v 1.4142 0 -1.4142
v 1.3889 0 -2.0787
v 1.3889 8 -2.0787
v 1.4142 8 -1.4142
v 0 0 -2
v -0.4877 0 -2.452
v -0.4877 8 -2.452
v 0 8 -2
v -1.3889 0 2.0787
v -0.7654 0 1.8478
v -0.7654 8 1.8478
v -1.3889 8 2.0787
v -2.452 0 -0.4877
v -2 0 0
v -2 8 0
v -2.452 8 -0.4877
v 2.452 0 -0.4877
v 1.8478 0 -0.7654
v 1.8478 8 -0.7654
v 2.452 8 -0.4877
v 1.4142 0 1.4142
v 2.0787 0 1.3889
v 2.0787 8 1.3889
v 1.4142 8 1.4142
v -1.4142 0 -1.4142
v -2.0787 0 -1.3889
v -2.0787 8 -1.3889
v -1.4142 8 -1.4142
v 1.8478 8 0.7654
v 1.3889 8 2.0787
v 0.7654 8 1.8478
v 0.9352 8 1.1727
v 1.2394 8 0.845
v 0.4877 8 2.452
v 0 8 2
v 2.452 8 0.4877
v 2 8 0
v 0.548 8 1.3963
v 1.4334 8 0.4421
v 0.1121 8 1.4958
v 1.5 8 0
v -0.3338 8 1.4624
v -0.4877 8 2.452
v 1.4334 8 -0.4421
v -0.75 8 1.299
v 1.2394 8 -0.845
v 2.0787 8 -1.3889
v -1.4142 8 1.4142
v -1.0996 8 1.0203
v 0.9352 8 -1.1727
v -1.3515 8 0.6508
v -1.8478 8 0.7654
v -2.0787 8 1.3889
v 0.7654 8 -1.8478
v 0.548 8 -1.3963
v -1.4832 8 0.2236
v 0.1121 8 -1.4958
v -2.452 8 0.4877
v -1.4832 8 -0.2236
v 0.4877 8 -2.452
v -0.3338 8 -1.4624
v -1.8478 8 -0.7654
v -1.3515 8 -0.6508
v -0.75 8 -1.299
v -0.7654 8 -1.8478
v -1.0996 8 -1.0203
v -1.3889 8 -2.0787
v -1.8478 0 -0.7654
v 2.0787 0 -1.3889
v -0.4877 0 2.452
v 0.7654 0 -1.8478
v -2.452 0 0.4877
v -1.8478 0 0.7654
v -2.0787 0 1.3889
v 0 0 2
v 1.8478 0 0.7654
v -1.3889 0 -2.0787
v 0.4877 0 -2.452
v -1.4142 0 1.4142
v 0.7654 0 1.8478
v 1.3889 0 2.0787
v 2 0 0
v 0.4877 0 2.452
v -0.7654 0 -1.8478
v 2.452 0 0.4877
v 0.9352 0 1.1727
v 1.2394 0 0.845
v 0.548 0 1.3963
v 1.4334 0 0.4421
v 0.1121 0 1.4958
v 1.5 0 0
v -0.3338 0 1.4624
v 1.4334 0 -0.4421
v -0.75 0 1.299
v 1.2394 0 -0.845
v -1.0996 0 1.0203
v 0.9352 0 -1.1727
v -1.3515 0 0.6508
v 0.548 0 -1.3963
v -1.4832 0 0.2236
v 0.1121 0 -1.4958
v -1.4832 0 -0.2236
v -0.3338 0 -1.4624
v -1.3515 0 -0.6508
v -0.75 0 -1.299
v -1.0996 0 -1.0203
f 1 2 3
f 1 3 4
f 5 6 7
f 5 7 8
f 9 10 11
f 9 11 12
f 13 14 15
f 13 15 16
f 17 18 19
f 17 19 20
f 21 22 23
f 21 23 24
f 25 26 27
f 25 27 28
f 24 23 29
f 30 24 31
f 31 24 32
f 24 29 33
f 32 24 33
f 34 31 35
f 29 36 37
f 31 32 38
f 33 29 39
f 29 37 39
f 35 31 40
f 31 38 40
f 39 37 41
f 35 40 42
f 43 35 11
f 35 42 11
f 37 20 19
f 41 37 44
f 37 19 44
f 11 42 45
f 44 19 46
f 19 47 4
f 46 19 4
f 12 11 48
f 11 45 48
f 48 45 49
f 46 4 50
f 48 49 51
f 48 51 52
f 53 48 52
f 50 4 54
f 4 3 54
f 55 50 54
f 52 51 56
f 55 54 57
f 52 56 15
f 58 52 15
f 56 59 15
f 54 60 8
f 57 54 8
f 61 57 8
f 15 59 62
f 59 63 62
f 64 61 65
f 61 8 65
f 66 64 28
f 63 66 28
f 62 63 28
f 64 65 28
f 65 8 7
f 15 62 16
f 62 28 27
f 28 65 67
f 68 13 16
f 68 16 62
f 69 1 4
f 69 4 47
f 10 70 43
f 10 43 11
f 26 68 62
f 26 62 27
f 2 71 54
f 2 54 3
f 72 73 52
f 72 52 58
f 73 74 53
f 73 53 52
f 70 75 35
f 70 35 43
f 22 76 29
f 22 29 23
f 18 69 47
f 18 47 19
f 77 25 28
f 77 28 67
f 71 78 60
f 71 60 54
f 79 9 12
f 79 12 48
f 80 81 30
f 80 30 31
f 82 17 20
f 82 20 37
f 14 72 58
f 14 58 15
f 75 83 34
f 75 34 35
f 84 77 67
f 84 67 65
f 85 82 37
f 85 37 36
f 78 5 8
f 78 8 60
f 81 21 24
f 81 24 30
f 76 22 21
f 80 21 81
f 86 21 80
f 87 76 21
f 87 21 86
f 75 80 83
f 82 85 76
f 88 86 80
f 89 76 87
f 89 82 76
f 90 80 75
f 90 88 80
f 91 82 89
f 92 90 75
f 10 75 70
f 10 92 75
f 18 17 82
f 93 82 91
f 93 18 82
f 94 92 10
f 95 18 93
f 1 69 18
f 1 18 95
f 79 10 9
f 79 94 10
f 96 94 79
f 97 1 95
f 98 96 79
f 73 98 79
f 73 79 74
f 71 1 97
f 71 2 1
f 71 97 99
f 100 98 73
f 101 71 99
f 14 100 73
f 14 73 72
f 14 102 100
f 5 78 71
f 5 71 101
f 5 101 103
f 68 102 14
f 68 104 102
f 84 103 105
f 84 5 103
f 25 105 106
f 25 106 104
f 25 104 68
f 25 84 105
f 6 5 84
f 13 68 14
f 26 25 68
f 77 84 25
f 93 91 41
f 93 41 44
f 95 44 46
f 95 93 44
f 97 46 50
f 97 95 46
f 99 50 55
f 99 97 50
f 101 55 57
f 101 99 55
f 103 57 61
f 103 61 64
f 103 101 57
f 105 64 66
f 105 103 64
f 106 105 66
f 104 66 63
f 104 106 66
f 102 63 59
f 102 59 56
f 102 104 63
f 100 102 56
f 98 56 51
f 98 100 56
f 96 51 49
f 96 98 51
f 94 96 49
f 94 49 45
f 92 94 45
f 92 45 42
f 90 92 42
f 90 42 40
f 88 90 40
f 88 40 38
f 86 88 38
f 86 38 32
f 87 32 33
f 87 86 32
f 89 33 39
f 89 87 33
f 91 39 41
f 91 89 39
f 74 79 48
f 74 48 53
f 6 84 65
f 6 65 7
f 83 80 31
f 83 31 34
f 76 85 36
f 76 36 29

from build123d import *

# Parameters (mm, degrees)
SKETCH1_R           = 1.5
BOSS_EXTRUDE1_DEPTH = 8


with BuildPart() as part:
    # Sketch1 → Boss-Extrude1 (new body)
    with BuildSketch(Plane(origin=(0, 0, 0), x_dir=(1, 0, 0), z_dir=(0, 1, 0))):
        Polygon((0, 2), (0.487725805, 2.451963201), (0.765366865, 1.847759065), (1.388925583, 2.078674031), (1.414213562, 1.414213562), (2.078674031, 1.388925583), (1.847759065, 0.765366865), (2.451963201, 0.487725805), (2, 0), (2.451963201, -0.487725805), (1.847759065, -0.765366865), (2.078674031, -1.388925583), (1.414213562, -1.414213562), (1.388925583, -2.078674031), (0.765366865, -1.847759065), (0.487725805, -2.451963201), (0, -2), (-0.487725805, -2.451963201), (-0.765366865, -1.847759065), (-1.388925583, -2.078674031), (-1.414213562, -1.414213562), (-2.078674031, -1.388925583), (-1.847759065, -0.765366865), (-2.451963201, -0.487725805), (-2, 0), (-2.451963201, 0.487725805), (-1.847759065, 0.765366865), (-2.078674031, 1.388925583), (-1.414213562, 1.414213562), (-1.388925583, 2.078674031), (-0.765366865, 1.847759065), (-0.487725805, 2.451963201), align=None)
        Circle(SKETCH1_R, mode=Mode.SUBTRACT)
    extrude(amount=BOSS_EXTRUDE1_DEPTH)


solid = part.part
